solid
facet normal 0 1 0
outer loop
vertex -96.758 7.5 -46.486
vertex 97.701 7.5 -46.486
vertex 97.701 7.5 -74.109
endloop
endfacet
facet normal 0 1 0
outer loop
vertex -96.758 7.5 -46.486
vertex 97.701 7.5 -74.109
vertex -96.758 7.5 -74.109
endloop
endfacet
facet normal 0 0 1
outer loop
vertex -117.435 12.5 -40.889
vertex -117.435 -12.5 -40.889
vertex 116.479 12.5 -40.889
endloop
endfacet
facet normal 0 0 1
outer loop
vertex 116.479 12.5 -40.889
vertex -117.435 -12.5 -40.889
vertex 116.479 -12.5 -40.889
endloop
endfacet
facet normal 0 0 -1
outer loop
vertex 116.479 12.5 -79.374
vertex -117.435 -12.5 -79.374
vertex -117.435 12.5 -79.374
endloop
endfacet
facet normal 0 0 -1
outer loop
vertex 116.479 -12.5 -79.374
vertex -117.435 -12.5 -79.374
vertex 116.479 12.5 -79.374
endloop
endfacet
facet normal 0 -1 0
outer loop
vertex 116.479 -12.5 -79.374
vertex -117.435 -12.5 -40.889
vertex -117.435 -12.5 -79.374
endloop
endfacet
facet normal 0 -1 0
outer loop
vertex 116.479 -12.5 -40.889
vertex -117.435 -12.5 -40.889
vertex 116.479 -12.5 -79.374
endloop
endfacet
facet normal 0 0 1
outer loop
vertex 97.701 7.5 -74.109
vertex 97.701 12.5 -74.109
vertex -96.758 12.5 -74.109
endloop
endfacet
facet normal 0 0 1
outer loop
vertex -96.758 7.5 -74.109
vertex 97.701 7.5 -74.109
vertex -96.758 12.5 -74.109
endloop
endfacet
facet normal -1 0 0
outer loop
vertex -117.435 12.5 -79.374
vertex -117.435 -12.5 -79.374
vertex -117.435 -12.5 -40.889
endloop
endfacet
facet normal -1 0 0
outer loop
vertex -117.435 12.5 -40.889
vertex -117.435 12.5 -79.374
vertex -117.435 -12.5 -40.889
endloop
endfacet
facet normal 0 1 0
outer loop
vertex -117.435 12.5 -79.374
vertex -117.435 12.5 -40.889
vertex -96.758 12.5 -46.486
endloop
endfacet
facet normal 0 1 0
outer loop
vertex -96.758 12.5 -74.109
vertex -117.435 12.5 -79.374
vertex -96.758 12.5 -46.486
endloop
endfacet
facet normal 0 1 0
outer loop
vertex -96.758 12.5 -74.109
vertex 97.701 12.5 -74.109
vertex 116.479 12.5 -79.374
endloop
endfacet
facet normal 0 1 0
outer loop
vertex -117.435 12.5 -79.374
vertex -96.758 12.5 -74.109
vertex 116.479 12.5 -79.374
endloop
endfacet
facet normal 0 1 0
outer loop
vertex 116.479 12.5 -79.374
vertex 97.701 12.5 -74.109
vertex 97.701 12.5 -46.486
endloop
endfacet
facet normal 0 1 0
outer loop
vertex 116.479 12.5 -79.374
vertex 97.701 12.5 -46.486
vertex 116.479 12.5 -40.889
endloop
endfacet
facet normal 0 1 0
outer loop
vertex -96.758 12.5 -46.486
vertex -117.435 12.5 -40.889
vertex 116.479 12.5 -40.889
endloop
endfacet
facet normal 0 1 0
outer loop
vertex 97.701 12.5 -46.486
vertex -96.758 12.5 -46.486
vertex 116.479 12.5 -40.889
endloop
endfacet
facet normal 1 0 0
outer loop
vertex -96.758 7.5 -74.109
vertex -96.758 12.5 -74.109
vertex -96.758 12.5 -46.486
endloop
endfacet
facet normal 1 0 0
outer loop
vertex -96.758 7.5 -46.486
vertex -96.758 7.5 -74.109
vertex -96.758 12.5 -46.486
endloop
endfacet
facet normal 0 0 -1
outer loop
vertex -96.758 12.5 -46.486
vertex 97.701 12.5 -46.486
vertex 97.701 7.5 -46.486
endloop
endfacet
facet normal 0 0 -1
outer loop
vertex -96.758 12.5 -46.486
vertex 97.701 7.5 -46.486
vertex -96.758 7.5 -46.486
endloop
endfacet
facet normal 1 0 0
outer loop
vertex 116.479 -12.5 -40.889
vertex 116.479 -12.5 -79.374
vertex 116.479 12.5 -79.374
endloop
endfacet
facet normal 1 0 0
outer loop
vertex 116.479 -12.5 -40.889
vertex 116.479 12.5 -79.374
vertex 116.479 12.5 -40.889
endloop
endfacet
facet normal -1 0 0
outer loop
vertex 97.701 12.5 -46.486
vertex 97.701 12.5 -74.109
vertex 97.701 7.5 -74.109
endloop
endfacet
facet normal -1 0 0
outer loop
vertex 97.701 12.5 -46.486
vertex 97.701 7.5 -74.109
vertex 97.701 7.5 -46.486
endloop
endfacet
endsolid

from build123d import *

# Parameters (mm, degrees)
F2_W     = 233.913794
F2_H     = 38.484163
F3_DEPTH = 12.5
F4_W     = 194.459587
F4_H     = 27.622782
F5_DEPTH = 5


with BuildPart() as f3:
    # F2 (on Front) → F3 (new body, symmetric)
    with BuildSketch(Plane.XZ):
        with Locations((-0.478029, -60.131501)):
            Rectangle(F2_W, F2_H)
    extrude(amount=F3_DEPTH, both=True)

    # F4 (on face) → F5 (cut)
    with BuildSketch(Plane(origin=(0, 12.5, 0), x_dir=(-1, 0, 0), z_dir=(0, 1, 0))):
        with Locations((-0.471421, -60.297381)):
            Rectangle(F4_W, F4_H)
    extrude(amount=-F5_DEPTH, mode=Mode.SUBTRACT)


solid = f3.part
